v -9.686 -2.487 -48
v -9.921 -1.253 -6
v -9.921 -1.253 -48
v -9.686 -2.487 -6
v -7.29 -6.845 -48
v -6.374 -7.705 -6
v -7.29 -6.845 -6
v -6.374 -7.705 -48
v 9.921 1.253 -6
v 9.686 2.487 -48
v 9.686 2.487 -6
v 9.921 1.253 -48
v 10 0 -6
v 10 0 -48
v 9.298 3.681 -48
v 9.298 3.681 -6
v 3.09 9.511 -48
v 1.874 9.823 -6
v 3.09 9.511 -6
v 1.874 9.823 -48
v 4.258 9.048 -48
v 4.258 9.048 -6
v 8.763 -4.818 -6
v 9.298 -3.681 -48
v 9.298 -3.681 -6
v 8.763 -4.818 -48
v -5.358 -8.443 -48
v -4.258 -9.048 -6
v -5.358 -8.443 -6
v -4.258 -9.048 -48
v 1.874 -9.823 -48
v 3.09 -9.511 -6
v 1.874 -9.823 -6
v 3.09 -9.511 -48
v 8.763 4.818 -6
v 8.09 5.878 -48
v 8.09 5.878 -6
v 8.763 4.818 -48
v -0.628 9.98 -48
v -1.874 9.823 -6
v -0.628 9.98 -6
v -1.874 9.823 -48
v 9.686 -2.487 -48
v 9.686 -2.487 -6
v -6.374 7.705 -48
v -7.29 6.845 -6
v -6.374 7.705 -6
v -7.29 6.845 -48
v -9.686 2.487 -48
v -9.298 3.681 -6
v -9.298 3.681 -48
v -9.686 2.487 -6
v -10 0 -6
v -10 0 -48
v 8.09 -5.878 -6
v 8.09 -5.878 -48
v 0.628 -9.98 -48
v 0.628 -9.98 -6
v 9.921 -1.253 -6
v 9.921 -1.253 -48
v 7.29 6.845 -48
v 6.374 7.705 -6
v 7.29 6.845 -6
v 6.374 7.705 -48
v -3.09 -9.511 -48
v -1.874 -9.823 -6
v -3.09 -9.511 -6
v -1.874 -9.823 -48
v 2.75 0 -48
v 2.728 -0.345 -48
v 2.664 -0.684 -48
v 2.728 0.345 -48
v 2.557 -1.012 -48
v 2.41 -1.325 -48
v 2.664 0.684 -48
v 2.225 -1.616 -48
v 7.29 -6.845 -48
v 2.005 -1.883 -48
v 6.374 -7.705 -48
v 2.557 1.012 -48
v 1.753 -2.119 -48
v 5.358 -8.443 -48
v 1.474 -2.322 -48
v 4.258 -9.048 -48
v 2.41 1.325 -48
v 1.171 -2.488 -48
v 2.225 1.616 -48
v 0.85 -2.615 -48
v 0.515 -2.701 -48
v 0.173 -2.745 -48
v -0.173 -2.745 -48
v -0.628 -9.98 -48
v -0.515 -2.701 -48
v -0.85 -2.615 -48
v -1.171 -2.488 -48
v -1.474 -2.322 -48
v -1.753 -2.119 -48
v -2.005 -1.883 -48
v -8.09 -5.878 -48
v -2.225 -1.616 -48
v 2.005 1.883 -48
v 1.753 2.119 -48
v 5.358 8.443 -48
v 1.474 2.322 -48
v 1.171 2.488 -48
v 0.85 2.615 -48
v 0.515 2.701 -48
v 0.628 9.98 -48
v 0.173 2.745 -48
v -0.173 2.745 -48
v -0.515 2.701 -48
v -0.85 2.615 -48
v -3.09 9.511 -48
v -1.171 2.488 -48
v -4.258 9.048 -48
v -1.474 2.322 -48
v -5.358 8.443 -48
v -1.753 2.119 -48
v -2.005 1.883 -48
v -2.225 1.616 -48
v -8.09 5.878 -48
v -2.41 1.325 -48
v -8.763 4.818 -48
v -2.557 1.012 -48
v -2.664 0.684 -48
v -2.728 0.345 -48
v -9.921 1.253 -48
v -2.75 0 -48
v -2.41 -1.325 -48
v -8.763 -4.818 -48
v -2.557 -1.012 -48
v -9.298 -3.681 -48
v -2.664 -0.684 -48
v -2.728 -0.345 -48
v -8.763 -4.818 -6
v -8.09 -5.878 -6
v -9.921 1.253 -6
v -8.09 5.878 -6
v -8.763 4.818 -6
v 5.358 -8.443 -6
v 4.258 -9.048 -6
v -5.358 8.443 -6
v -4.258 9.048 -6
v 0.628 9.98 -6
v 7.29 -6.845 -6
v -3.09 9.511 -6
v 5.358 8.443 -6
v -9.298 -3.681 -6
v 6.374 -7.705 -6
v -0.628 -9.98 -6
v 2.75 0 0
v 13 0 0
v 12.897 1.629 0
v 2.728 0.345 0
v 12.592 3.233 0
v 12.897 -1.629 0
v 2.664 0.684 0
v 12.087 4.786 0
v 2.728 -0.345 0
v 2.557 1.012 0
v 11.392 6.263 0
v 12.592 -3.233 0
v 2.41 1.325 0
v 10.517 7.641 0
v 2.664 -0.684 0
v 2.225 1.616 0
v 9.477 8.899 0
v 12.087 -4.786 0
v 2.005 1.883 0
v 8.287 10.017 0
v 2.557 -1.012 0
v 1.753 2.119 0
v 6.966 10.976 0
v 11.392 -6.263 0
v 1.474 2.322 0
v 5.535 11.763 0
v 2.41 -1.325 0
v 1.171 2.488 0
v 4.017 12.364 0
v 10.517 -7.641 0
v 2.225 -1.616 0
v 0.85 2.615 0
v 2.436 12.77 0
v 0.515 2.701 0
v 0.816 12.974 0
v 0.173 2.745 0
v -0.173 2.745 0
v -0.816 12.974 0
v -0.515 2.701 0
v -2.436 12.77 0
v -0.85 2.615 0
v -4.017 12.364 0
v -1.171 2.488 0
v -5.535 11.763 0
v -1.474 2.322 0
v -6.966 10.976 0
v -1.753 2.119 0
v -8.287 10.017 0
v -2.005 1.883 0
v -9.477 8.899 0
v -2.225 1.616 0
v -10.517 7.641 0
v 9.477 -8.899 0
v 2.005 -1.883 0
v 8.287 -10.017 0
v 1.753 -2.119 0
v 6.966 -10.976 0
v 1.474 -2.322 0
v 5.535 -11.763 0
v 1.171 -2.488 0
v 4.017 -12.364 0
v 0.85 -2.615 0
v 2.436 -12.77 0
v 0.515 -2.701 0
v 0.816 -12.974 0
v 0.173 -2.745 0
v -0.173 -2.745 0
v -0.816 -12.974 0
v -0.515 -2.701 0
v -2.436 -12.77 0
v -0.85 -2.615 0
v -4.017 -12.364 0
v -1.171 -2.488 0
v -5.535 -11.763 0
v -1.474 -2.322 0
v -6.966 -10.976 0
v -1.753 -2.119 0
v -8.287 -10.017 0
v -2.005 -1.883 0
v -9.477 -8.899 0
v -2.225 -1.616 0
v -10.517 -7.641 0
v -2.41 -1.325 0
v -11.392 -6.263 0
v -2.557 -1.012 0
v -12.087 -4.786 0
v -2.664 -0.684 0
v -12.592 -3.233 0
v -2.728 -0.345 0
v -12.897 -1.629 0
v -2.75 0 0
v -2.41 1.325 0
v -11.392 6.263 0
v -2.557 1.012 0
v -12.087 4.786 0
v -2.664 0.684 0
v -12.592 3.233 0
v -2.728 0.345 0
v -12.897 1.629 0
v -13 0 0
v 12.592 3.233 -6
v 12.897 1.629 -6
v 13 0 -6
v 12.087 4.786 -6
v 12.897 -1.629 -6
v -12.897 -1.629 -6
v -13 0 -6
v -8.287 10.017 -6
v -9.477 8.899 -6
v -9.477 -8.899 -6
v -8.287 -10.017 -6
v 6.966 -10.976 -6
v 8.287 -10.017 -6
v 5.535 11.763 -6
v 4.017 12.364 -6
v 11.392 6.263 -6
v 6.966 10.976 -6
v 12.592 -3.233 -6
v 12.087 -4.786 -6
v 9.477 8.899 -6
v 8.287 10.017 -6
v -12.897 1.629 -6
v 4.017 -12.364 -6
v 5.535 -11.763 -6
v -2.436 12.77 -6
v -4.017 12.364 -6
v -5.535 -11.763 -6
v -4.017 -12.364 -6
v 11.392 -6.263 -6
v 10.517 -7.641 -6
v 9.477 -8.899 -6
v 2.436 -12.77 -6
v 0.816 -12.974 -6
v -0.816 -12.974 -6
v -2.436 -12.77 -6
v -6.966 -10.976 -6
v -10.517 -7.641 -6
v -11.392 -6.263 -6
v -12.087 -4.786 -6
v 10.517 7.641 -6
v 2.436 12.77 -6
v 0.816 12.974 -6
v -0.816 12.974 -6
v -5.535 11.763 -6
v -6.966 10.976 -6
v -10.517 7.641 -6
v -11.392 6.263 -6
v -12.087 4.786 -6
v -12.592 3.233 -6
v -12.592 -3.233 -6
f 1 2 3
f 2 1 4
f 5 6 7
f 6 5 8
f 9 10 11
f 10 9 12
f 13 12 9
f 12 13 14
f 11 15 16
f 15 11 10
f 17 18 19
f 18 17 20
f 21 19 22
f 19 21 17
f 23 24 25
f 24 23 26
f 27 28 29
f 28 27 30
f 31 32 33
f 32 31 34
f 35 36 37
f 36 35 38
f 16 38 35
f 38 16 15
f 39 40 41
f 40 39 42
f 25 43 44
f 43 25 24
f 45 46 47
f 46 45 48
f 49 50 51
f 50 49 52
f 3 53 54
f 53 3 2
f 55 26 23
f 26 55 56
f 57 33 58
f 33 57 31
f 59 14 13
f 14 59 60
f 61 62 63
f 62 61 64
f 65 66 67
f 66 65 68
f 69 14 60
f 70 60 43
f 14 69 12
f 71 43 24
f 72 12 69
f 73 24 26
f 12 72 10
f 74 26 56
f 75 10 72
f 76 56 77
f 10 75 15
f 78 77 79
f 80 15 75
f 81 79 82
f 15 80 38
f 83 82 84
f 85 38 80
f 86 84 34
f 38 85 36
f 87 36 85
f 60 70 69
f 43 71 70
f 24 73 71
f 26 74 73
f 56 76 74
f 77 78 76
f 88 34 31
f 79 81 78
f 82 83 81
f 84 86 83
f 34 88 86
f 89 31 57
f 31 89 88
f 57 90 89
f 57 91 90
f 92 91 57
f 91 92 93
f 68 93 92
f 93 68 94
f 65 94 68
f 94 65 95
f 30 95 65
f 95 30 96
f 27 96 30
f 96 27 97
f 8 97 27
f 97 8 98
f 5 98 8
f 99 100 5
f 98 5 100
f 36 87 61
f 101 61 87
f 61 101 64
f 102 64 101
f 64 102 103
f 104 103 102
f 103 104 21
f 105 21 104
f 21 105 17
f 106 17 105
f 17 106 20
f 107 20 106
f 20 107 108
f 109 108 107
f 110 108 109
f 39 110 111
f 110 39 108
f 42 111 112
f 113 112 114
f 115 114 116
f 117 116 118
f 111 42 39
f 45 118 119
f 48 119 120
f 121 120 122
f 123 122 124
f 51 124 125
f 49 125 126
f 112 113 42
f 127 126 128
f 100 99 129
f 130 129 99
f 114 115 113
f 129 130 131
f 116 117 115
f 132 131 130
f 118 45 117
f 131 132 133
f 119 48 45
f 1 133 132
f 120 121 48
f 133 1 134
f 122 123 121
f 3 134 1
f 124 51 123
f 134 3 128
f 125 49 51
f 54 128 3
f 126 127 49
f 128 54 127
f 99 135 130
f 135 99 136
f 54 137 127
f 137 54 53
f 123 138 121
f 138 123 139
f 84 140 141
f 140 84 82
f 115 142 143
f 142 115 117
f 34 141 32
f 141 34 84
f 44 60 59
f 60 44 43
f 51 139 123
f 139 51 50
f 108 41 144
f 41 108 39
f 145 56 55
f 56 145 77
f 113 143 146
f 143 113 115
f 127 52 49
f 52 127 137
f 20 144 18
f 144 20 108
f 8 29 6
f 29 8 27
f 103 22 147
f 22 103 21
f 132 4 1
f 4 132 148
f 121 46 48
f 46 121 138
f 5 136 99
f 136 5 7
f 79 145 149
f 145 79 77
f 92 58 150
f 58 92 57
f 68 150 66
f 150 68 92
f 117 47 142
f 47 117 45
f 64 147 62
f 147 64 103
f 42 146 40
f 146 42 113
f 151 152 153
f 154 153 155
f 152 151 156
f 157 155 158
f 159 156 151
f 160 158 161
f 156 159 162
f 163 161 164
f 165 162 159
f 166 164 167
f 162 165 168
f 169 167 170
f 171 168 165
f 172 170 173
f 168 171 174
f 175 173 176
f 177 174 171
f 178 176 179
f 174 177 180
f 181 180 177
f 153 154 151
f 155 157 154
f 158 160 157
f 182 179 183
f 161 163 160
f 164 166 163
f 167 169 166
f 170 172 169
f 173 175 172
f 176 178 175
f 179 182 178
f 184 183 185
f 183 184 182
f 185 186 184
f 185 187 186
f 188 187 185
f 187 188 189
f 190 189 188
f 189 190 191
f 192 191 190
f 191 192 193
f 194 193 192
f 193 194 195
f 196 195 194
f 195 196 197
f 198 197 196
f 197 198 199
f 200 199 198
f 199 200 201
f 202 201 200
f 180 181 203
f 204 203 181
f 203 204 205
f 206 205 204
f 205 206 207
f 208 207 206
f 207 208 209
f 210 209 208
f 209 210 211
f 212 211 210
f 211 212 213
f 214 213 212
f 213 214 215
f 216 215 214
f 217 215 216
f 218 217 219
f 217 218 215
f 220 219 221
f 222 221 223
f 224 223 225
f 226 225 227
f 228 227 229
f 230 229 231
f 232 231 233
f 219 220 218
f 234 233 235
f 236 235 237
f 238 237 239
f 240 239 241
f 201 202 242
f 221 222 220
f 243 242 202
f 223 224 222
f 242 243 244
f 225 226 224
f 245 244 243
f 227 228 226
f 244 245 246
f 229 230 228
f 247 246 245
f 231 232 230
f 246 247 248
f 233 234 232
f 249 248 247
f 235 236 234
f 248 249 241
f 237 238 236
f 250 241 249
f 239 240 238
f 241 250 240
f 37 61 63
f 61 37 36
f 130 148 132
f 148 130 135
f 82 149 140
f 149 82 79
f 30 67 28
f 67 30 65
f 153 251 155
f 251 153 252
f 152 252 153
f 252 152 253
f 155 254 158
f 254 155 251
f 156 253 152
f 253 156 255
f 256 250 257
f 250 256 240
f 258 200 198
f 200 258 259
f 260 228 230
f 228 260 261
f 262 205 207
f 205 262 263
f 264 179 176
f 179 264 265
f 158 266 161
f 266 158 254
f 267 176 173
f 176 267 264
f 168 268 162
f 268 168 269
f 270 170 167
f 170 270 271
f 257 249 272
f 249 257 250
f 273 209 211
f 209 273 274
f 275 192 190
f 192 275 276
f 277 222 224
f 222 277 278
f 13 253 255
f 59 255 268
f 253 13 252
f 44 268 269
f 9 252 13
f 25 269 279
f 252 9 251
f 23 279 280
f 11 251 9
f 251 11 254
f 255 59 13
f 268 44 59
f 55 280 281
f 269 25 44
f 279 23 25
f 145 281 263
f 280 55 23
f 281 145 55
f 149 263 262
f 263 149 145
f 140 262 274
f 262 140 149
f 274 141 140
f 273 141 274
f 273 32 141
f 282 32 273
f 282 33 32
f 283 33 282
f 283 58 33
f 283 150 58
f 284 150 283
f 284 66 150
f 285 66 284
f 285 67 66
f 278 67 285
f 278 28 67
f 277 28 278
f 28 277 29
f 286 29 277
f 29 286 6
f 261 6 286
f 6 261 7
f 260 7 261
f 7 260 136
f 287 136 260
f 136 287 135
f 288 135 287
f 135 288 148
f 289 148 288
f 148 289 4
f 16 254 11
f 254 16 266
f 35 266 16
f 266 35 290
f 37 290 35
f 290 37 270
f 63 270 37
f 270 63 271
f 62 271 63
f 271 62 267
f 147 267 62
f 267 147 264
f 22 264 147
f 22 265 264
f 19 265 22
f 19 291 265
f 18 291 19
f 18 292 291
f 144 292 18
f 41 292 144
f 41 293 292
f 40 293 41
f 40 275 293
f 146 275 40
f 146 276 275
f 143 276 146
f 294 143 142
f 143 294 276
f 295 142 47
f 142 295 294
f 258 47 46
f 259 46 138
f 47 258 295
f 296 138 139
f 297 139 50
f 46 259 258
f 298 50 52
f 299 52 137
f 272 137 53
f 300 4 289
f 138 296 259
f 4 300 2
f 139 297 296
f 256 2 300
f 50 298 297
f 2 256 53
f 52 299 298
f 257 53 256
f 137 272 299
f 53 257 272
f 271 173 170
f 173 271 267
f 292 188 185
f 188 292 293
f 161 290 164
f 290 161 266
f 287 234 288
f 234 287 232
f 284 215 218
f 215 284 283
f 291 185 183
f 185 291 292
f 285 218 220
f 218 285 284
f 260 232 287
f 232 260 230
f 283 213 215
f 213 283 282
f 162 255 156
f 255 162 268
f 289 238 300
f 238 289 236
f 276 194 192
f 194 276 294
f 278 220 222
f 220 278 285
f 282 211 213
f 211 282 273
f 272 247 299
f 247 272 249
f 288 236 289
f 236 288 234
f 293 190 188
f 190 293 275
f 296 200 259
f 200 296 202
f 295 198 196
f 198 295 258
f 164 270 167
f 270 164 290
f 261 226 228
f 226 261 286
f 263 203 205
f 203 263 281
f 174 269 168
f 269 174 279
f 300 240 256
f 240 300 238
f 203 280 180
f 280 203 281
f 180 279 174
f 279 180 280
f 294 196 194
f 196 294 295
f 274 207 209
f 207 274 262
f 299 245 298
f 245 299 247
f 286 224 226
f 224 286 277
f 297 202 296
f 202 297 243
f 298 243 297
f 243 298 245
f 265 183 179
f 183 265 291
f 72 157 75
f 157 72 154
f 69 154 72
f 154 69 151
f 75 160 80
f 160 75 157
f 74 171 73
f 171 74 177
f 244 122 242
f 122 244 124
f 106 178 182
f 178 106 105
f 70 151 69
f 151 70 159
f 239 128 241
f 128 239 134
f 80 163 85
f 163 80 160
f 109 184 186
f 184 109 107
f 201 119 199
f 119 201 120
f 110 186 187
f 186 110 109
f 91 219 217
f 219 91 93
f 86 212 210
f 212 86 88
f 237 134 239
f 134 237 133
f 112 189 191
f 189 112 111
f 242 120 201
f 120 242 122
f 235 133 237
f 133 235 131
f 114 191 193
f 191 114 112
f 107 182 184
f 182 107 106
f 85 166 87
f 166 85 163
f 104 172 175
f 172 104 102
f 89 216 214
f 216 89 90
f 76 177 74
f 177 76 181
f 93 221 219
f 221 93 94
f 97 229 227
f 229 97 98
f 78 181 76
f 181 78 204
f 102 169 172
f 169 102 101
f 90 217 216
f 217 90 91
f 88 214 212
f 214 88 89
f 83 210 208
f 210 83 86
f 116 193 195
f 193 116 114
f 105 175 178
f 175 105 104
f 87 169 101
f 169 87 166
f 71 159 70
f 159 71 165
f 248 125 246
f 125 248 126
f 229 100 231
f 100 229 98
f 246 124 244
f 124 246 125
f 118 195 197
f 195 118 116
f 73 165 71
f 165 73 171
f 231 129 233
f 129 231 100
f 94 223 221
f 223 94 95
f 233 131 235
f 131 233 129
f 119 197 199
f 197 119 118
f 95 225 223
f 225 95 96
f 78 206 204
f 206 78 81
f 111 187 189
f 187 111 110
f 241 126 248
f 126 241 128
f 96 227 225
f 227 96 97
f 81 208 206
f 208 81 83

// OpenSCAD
$fn = 50;


difference() {
	union() {
		translate(v = [0, 0, -48.0000000000]) {
			cylinder(h = 48, r = 10.0000000000);
		}
		translate(v = [0, 0, -6.0000000000]) {
			cylinder(h = 6, r = 13.0000000000);
		}
	}
	union() {
		#translate(v = [0, 0, -48]) {
			cylinder(h = 48, r = 2.7500000000);
		}
	}
}
